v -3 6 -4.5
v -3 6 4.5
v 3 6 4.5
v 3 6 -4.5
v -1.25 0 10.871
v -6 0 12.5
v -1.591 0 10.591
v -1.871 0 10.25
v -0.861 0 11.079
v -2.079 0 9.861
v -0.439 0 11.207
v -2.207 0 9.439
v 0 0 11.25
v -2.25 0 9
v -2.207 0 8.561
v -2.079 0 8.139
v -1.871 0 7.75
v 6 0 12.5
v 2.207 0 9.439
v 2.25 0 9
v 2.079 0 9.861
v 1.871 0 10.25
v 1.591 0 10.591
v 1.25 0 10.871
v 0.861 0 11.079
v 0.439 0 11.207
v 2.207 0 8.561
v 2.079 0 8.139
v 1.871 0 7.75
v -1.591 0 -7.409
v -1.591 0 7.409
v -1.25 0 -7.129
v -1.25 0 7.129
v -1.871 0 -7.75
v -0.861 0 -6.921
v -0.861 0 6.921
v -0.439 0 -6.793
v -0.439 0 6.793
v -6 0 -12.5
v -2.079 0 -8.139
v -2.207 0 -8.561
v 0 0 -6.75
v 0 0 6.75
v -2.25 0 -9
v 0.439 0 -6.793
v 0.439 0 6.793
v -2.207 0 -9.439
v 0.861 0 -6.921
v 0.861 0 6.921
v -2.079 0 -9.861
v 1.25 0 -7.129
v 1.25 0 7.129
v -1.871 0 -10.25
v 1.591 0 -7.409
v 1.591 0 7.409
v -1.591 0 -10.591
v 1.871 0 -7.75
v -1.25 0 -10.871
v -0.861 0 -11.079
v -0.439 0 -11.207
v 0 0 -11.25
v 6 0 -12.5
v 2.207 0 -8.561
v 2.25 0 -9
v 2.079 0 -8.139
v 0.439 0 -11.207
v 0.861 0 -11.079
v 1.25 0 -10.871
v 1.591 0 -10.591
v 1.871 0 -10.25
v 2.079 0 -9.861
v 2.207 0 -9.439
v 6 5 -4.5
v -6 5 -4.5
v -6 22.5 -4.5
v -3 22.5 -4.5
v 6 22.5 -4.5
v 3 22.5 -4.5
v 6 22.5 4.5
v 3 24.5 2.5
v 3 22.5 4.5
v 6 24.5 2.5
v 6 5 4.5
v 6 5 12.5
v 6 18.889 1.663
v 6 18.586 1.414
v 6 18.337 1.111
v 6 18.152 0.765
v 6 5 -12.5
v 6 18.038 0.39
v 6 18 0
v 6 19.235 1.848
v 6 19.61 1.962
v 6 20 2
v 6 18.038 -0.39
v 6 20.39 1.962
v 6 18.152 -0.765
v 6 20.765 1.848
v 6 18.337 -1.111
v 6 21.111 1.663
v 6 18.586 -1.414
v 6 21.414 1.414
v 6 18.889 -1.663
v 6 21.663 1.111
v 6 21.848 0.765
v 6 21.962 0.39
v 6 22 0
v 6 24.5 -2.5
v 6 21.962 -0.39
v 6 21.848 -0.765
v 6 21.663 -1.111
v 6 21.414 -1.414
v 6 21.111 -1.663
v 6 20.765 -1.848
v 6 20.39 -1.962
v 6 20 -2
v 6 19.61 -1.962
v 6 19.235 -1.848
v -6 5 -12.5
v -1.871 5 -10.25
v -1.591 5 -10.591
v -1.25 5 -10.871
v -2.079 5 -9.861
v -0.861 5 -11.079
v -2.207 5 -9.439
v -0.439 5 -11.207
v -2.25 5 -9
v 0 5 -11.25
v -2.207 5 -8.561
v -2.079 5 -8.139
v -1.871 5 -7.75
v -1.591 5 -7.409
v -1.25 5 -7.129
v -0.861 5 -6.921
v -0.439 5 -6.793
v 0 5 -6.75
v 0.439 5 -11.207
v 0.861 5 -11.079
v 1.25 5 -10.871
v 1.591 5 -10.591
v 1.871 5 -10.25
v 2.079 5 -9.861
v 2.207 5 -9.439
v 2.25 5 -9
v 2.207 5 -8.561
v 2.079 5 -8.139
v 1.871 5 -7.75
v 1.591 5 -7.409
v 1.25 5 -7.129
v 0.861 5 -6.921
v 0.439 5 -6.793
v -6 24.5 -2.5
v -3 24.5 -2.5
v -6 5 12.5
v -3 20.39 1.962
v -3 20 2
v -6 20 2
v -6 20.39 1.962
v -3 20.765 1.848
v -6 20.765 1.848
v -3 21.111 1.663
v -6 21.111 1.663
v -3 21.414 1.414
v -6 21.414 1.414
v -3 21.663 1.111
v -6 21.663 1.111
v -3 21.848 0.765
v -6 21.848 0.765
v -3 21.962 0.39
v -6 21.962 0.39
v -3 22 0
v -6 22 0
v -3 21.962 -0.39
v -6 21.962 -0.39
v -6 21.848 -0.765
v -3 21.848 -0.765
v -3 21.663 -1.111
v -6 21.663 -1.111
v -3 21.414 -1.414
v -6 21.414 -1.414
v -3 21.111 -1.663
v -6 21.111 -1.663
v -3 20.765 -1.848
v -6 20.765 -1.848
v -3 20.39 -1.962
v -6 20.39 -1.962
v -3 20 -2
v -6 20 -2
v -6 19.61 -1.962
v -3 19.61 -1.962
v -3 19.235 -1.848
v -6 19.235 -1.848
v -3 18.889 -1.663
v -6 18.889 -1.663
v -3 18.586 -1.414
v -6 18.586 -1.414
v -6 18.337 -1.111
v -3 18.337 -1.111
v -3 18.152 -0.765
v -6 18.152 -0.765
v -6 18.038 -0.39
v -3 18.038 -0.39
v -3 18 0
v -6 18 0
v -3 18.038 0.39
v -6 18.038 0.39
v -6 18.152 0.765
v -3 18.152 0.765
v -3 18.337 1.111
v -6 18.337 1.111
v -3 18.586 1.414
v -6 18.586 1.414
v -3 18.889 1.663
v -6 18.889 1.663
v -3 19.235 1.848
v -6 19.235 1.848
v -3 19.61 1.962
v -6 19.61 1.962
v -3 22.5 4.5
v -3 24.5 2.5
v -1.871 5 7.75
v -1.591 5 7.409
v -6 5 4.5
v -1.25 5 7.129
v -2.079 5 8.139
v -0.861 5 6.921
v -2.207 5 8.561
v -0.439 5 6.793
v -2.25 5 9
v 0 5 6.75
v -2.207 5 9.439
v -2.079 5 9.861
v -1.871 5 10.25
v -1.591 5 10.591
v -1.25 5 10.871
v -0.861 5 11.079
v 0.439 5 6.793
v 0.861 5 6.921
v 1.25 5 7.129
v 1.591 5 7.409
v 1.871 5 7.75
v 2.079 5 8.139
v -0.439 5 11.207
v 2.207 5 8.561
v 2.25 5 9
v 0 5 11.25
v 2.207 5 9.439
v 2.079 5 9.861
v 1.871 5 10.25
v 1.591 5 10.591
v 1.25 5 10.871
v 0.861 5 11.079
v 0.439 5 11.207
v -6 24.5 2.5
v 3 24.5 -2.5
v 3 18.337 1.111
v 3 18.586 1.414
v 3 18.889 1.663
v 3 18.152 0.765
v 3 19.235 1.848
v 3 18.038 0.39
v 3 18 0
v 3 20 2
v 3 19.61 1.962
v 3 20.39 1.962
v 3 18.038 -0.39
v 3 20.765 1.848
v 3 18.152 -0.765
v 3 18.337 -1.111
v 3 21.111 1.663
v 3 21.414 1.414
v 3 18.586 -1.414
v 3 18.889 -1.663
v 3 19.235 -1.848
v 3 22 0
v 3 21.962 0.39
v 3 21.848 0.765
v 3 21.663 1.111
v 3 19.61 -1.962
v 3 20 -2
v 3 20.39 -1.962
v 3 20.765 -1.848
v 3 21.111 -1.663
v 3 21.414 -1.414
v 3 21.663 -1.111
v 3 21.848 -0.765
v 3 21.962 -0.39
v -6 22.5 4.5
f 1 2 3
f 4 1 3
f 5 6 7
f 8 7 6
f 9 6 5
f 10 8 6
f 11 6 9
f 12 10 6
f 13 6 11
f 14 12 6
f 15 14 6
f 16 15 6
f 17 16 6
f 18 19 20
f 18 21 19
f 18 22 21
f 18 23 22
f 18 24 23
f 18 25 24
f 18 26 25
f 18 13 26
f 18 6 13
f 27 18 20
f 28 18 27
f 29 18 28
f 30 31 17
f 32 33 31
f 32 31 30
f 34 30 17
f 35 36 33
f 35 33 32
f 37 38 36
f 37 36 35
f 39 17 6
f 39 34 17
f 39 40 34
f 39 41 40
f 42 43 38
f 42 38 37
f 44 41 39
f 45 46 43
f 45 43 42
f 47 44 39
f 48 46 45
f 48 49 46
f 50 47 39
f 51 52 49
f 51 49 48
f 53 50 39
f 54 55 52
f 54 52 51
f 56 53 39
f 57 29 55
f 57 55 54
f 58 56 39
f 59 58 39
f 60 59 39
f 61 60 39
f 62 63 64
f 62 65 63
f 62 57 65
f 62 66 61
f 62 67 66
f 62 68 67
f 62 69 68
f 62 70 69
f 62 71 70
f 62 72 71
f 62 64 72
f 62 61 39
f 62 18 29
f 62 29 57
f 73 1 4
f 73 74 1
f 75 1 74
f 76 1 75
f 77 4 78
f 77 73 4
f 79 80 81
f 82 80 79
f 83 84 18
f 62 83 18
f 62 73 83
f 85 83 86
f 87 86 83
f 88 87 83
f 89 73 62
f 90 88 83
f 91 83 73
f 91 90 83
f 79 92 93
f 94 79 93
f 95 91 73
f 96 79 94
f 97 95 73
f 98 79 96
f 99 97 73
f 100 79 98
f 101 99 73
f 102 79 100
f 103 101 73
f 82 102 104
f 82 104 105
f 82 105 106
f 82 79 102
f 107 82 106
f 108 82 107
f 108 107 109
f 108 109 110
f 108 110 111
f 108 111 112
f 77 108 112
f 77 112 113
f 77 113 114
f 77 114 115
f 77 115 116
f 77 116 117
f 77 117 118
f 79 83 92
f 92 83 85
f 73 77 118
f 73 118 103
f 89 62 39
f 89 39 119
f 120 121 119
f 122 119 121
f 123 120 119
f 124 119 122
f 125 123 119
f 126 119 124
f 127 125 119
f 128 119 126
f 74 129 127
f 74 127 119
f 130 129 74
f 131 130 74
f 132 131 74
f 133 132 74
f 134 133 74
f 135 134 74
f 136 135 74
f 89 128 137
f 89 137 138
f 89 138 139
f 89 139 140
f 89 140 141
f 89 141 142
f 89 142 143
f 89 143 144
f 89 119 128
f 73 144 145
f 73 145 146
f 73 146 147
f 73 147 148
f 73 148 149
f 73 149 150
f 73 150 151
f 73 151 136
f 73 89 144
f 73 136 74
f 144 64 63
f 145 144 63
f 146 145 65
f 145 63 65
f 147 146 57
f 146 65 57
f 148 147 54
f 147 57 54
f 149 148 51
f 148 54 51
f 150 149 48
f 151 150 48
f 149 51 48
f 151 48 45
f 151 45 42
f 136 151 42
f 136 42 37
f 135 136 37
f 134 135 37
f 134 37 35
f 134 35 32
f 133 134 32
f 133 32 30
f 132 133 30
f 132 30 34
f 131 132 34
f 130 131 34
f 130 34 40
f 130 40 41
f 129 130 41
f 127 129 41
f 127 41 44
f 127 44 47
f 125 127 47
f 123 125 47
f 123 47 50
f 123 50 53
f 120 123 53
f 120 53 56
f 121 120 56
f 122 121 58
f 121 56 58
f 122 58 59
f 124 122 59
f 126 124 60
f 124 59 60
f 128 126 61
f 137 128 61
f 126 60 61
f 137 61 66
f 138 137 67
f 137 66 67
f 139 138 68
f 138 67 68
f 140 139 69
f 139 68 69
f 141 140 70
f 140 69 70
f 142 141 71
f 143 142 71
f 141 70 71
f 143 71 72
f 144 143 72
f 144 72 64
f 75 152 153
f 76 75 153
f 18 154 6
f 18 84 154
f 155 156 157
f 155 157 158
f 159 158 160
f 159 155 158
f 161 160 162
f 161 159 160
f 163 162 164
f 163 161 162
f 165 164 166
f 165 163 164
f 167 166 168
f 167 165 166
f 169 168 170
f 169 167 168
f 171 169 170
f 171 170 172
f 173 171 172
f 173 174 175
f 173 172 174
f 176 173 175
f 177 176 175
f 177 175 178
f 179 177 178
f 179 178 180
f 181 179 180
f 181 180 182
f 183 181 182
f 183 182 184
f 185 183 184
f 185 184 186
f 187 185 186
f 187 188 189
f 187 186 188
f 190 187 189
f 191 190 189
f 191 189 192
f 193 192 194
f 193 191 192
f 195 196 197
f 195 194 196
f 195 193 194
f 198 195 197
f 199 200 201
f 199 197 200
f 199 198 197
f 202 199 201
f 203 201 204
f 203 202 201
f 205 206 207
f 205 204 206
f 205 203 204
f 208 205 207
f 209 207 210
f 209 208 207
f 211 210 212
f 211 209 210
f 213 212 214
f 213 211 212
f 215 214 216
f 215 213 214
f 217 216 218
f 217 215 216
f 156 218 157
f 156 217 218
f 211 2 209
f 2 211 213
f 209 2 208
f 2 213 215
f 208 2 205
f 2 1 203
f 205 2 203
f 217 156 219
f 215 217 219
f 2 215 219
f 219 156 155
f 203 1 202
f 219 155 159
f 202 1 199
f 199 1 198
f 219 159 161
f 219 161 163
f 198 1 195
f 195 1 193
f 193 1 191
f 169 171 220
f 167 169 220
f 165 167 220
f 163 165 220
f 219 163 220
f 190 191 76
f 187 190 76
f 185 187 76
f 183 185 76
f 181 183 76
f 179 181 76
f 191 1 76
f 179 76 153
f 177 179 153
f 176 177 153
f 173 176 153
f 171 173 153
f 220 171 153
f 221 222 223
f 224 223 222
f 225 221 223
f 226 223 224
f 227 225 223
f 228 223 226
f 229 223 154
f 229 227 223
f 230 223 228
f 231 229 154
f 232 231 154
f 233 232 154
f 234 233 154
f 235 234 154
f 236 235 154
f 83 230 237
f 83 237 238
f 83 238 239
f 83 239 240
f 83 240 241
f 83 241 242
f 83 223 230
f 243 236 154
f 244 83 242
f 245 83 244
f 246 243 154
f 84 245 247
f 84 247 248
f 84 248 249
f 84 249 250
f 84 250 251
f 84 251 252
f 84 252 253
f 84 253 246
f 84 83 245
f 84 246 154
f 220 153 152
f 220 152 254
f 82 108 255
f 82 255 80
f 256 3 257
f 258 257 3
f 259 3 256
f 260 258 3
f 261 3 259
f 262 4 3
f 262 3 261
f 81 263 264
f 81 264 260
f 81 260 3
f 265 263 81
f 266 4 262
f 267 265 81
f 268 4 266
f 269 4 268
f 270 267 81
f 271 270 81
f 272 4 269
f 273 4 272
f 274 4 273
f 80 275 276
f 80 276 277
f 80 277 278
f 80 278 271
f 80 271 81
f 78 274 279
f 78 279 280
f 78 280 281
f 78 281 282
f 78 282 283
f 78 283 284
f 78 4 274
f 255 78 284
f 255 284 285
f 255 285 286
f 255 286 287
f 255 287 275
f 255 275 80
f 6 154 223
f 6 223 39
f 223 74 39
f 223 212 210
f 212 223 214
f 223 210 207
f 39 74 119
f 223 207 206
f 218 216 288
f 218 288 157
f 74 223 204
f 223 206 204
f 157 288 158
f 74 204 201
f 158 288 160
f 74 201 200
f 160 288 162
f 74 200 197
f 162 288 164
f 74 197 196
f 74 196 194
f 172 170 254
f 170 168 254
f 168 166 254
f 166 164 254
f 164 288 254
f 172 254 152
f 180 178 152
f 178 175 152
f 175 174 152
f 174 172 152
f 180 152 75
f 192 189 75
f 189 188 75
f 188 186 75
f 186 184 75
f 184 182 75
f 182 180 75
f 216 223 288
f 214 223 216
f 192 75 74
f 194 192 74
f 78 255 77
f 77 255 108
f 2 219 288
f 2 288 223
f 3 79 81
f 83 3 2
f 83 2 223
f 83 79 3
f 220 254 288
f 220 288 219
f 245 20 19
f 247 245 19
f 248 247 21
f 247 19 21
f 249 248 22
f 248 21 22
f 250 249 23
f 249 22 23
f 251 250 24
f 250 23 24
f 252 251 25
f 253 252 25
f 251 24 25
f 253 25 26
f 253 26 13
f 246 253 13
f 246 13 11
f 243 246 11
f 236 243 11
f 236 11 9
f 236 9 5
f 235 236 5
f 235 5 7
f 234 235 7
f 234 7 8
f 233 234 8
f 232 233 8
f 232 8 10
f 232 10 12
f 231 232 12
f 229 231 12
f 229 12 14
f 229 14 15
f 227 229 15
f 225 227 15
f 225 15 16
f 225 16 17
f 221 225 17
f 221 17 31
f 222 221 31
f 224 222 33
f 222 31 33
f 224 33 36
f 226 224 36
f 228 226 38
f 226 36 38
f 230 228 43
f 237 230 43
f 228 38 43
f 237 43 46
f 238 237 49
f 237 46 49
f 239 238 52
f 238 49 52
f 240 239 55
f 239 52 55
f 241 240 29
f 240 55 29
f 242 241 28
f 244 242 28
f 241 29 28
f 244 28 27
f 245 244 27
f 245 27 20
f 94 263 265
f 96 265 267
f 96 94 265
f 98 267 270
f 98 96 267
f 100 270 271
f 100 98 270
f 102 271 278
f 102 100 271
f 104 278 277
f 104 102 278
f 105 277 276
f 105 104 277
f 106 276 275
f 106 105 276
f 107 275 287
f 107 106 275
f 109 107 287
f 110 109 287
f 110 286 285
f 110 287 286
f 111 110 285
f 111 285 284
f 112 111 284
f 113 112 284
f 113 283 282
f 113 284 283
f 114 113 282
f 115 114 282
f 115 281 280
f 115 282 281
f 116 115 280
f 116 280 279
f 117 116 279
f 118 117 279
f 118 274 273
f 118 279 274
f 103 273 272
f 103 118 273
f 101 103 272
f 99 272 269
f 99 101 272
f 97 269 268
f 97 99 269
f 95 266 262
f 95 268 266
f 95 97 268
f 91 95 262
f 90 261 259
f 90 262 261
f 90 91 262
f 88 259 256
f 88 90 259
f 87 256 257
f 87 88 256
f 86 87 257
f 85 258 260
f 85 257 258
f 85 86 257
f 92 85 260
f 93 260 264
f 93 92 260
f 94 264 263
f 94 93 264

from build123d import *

# Parameters (mm, degrees)
BOSS_EXTRUDE1_DEPTH     = 6
SKETCH2_R               = 2
CUT_EXTRUDE1_DEPTH      = 31.894983412
CHAMFER1_SIZE           = 2
DIAMETER_HOLE1_D        = 4.5
CUT_EXTRUDE2_DEPTH      = 29.151376521
CUT_EXTRUDE2_DEPTH_BACK = 29.151376521
SKETCH5_W               = 6
SKETCH5_H               = 18.5


with BuildPart() as part:
    # Sketch1 → Boss-Extrude1 (new, symmetric)
    with BuildSketch(Plane(origin=(0, 0, 0), x_dir=(0, 0, -1), z_dir=(1, 0, 0))):
        Polygon((-12.5, 0), (12.5, 0), (12.5, 5), (4.5, 5), (4.5, 24.5), (-4.5, 24.5), (-4.5, 5), (-12.5, 5), align=None)
    extrude(amount=BOSS_EXTRUDE1_DEPTH, both=True)

    # Sketch2 → Cut-Extrude1 (cut, through all)
    with BuildSketch(Plane(origin=(6, 0, -2), x_dir=(0, 0, 1), z_dir=(-1, 0, 0))):
        with Locations((2, 20)):
            Circle(SKETCH2_R)
    extrude(amount=CUT_EXTRUDE1_DEPTH, mode=Mode.SUBTRACT)

    # Chamfer1
    chamfer1_edges = [part.edges().sort_by_distance(p)[0] for p in [
        (0, 24.5, 4.5),
        (0, 24.5, -4.5),
    ]]
    chamfer(chamfer1_edges, length=CHAMFER1_SIZE)

    # Diameter Hole1 (through all)
    with Locations(Plane(origin=(5.400260834, 5, -6.193239857), x_dir=(-1, 0, 0), z_dir=(0, 1, 0))):
        with Locations((5.400260834, 15.193239857), (5.400260834, -2.806760143)):
            Hole(DIAMETER_HOLE1_D / 2)

    # Sketch5 → Cut-Extrude2 (cut, two sides: drawn at the far end of the back side and taken through both)
    with BuildSketch(Plane.XY.offset(-CUT_EXTRUDE2_DEPTH_BACK)):
        with Locations((0, 15.25)):
            Rectangle(SKETCH5_W, SKETCH5_H)
    extrude(amount=CUT_EXTRUDE2_DEPTH + CUT_EXTRUDE2_DEPTH_BACK, mode=Mode.SUBTRACT)


solid = part.part
